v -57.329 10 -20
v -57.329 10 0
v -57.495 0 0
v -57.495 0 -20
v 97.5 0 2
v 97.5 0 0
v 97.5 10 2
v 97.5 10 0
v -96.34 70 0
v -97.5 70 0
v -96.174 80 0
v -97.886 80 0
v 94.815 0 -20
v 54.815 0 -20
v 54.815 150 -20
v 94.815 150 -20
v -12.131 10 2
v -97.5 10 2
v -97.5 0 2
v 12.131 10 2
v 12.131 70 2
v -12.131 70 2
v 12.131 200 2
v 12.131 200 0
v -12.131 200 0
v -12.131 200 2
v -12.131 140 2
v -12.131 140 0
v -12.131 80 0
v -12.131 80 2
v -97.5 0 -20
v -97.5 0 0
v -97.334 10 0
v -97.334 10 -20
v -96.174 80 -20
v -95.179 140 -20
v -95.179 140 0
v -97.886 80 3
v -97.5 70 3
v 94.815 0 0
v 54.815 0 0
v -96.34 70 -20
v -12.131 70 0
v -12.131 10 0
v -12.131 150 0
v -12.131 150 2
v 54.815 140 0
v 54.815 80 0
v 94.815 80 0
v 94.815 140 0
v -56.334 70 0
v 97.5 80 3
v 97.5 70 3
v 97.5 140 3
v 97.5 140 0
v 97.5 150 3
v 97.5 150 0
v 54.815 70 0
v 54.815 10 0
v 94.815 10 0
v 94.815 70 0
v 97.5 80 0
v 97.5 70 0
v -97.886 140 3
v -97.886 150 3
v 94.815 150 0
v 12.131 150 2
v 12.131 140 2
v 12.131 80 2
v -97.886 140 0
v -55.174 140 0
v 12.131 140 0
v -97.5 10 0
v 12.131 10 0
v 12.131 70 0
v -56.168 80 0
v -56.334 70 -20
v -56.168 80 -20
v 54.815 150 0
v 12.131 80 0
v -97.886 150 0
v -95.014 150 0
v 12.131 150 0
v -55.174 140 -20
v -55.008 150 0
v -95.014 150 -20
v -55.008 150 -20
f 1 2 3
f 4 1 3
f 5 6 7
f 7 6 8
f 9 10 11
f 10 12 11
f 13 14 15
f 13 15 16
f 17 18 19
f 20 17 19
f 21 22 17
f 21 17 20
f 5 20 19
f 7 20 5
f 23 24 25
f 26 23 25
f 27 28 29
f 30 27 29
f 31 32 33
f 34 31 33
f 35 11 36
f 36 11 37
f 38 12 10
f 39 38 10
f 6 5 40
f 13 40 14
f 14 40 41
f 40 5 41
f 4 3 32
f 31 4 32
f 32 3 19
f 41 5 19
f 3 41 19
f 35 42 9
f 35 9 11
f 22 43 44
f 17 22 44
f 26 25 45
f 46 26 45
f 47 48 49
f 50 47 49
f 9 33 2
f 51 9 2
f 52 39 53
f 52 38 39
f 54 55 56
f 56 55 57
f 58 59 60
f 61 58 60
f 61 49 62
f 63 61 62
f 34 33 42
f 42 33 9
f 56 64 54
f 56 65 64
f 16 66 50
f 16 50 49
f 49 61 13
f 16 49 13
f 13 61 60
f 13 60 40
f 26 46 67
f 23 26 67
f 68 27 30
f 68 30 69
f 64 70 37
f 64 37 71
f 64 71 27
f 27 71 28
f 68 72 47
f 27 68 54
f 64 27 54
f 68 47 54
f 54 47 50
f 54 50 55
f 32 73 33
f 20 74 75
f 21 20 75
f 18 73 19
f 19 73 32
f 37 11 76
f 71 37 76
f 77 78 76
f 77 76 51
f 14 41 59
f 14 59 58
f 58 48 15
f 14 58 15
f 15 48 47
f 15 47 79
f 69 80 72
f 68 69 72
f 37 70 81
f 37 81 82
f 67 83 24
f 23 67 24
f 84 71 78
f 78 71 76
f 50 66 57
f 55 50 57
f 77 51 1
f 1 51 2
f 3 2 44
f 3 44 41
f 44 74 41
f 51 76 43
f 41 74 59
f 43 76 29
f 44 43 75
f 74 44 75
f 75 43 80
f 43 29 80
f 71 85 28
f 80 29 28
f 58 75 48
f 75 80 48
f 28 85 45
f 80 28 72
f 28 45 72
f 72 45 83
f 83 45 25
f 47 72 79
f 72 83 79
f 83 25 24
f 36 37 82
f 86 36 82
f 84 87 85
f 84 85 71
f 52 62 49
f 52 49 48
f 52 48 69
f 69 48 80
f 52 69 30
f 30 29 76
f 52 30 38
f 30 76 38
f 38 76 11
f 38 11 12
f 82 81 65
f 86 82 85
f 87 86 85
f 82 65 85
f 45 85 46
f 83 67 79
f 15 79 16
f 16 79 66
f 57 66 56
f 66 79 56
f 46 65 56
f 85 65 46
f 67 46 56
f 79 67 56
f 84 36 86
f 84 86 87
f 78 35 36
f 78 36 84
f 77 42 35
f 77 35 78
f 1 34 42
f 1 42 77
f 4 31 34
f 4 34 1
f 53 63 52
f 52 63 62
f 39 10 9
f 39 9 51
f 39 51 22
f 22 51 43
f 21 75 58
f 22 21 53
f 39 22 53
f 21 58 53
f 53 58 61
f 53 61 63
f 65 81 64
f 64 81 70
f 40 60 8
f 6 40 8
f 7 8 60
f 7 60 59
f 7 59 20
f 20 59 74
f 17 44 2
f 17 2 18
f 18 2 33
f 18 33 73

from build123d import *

# Parameters (mm, degrees)
F1_DEPTH = 2
F3_DEPTH = 2
F4_DEPTH = 3
F5_DEPTH = 2
F6_W     = 40
F6_H     = 10
F6_H_2   = 60
F7_DEPTH = 20


with BuildPart() as f1:
    # F0 (on Top) → F1 (new body)
    with BuildSketch(Plane.XY):
        Polygon((-12.130910923, 0), (0, 0), (12.130910923, 0), (12.130910923, 200), (-12.130910923, 200), align=None)
    extrude(amount=F1_DEPTH)

    # F2 (on Top) → F3 (join)
    with BuildSketch(Plane.XY):
        Polygon((-97.5, 0), (0, 0), (97.5, 0), (97.5, 10), (-97.5, 10), align=None)
        Polygon((-97.5, 70), (0, 70), (97.5, 70), (97.5, 80), (-97.8855118155, 80), align=None)
        Polygon((-97.8855118155, 140), (0, 140), (97.5, 140), (97.5, 150), (-97.8855118155, 150), align=None)
    extrude(amount=F3_DEPTH)

    # F2 (on Top) → F4 (join)
    with BuildSketch(Plane.XY):
        Polygon((-97.5, 70), (0, 70), (97.5, 70), (97.5, 80), (-97.8855118155, 80), align=None)
        Polygon((-97.8855118155, 140), (0, 140), (97.5, 140), (97.5, 150), (-97.8855118155, 150), align=None)
    extrude(amount=F4_DEPTH)

    # F2 (on Top) → F5 (join)
    with BuildSketch(Plane.XY):
        Polygon((-97.5, 0), (0, 0), (97.5, 0), (97.5, 10), (-97.5, 10), align=None)
        Polygon((-97.5, 70), (0, 70), (97.5, 70), (97.5, 80), (-97.8855118155, 80), align=None)
        Polygon((-97.8855118155, 140), (0, 140), (97.5, 140), (97.5, 150), (-97.8855118155, 150), align=None)
    extrude(amount=F5_DEPTH)

    # F6 (on face) → F7 (join)
    with BuildSketch(Plane(origin=(0, 0, 0), x_dir=(1, 0, 0), z_dir=(0, 0, -1))):
        Polygon((-57.4945055695, 0), (-97.5, 0), (-97.3342470533, -10), (-57.3287526228, -10), align=None)
        Polygon((-57.3287526228, -10), (-97.3342470533, -10), (-96.3397293732, -70), (-56.3342349427, -70), align=None)
        with Locations((74.8154554615, -5)):
            Rectangle(F6_W, F6_H)
        Polygon((-56.3342349427, -70), (-96.3397293732, -70), (-96.1739764266, -80), (-56.168481996, -80), align=None)
        with Locations((74.8154554615, -40)):
            Rectangle(F6_W, F6_H_2)
        Polygon((-56.168481996, -80), (-96.1739764266, -80), (-95.1794587465, -140), (-55.173964316, -140), align=None)
        with Locations((74.8154554615, -75)):
            Rectangle(F6_W, F6_H)
        Polygon((-55.173964316, -140), (-95.1794587465, -140), (-95.0137057998, -150), (-55.0082113693, -150), align=None)
        with Locations((74.8154554615, -110)):
            Rectangle(F6_W, F6_H_2)
        with Locations((74.8154554615, -145)):
            Rectangle(F6_W, F6_H)
    extrude(amount=F7_DEPTH)


solid = f1.part
